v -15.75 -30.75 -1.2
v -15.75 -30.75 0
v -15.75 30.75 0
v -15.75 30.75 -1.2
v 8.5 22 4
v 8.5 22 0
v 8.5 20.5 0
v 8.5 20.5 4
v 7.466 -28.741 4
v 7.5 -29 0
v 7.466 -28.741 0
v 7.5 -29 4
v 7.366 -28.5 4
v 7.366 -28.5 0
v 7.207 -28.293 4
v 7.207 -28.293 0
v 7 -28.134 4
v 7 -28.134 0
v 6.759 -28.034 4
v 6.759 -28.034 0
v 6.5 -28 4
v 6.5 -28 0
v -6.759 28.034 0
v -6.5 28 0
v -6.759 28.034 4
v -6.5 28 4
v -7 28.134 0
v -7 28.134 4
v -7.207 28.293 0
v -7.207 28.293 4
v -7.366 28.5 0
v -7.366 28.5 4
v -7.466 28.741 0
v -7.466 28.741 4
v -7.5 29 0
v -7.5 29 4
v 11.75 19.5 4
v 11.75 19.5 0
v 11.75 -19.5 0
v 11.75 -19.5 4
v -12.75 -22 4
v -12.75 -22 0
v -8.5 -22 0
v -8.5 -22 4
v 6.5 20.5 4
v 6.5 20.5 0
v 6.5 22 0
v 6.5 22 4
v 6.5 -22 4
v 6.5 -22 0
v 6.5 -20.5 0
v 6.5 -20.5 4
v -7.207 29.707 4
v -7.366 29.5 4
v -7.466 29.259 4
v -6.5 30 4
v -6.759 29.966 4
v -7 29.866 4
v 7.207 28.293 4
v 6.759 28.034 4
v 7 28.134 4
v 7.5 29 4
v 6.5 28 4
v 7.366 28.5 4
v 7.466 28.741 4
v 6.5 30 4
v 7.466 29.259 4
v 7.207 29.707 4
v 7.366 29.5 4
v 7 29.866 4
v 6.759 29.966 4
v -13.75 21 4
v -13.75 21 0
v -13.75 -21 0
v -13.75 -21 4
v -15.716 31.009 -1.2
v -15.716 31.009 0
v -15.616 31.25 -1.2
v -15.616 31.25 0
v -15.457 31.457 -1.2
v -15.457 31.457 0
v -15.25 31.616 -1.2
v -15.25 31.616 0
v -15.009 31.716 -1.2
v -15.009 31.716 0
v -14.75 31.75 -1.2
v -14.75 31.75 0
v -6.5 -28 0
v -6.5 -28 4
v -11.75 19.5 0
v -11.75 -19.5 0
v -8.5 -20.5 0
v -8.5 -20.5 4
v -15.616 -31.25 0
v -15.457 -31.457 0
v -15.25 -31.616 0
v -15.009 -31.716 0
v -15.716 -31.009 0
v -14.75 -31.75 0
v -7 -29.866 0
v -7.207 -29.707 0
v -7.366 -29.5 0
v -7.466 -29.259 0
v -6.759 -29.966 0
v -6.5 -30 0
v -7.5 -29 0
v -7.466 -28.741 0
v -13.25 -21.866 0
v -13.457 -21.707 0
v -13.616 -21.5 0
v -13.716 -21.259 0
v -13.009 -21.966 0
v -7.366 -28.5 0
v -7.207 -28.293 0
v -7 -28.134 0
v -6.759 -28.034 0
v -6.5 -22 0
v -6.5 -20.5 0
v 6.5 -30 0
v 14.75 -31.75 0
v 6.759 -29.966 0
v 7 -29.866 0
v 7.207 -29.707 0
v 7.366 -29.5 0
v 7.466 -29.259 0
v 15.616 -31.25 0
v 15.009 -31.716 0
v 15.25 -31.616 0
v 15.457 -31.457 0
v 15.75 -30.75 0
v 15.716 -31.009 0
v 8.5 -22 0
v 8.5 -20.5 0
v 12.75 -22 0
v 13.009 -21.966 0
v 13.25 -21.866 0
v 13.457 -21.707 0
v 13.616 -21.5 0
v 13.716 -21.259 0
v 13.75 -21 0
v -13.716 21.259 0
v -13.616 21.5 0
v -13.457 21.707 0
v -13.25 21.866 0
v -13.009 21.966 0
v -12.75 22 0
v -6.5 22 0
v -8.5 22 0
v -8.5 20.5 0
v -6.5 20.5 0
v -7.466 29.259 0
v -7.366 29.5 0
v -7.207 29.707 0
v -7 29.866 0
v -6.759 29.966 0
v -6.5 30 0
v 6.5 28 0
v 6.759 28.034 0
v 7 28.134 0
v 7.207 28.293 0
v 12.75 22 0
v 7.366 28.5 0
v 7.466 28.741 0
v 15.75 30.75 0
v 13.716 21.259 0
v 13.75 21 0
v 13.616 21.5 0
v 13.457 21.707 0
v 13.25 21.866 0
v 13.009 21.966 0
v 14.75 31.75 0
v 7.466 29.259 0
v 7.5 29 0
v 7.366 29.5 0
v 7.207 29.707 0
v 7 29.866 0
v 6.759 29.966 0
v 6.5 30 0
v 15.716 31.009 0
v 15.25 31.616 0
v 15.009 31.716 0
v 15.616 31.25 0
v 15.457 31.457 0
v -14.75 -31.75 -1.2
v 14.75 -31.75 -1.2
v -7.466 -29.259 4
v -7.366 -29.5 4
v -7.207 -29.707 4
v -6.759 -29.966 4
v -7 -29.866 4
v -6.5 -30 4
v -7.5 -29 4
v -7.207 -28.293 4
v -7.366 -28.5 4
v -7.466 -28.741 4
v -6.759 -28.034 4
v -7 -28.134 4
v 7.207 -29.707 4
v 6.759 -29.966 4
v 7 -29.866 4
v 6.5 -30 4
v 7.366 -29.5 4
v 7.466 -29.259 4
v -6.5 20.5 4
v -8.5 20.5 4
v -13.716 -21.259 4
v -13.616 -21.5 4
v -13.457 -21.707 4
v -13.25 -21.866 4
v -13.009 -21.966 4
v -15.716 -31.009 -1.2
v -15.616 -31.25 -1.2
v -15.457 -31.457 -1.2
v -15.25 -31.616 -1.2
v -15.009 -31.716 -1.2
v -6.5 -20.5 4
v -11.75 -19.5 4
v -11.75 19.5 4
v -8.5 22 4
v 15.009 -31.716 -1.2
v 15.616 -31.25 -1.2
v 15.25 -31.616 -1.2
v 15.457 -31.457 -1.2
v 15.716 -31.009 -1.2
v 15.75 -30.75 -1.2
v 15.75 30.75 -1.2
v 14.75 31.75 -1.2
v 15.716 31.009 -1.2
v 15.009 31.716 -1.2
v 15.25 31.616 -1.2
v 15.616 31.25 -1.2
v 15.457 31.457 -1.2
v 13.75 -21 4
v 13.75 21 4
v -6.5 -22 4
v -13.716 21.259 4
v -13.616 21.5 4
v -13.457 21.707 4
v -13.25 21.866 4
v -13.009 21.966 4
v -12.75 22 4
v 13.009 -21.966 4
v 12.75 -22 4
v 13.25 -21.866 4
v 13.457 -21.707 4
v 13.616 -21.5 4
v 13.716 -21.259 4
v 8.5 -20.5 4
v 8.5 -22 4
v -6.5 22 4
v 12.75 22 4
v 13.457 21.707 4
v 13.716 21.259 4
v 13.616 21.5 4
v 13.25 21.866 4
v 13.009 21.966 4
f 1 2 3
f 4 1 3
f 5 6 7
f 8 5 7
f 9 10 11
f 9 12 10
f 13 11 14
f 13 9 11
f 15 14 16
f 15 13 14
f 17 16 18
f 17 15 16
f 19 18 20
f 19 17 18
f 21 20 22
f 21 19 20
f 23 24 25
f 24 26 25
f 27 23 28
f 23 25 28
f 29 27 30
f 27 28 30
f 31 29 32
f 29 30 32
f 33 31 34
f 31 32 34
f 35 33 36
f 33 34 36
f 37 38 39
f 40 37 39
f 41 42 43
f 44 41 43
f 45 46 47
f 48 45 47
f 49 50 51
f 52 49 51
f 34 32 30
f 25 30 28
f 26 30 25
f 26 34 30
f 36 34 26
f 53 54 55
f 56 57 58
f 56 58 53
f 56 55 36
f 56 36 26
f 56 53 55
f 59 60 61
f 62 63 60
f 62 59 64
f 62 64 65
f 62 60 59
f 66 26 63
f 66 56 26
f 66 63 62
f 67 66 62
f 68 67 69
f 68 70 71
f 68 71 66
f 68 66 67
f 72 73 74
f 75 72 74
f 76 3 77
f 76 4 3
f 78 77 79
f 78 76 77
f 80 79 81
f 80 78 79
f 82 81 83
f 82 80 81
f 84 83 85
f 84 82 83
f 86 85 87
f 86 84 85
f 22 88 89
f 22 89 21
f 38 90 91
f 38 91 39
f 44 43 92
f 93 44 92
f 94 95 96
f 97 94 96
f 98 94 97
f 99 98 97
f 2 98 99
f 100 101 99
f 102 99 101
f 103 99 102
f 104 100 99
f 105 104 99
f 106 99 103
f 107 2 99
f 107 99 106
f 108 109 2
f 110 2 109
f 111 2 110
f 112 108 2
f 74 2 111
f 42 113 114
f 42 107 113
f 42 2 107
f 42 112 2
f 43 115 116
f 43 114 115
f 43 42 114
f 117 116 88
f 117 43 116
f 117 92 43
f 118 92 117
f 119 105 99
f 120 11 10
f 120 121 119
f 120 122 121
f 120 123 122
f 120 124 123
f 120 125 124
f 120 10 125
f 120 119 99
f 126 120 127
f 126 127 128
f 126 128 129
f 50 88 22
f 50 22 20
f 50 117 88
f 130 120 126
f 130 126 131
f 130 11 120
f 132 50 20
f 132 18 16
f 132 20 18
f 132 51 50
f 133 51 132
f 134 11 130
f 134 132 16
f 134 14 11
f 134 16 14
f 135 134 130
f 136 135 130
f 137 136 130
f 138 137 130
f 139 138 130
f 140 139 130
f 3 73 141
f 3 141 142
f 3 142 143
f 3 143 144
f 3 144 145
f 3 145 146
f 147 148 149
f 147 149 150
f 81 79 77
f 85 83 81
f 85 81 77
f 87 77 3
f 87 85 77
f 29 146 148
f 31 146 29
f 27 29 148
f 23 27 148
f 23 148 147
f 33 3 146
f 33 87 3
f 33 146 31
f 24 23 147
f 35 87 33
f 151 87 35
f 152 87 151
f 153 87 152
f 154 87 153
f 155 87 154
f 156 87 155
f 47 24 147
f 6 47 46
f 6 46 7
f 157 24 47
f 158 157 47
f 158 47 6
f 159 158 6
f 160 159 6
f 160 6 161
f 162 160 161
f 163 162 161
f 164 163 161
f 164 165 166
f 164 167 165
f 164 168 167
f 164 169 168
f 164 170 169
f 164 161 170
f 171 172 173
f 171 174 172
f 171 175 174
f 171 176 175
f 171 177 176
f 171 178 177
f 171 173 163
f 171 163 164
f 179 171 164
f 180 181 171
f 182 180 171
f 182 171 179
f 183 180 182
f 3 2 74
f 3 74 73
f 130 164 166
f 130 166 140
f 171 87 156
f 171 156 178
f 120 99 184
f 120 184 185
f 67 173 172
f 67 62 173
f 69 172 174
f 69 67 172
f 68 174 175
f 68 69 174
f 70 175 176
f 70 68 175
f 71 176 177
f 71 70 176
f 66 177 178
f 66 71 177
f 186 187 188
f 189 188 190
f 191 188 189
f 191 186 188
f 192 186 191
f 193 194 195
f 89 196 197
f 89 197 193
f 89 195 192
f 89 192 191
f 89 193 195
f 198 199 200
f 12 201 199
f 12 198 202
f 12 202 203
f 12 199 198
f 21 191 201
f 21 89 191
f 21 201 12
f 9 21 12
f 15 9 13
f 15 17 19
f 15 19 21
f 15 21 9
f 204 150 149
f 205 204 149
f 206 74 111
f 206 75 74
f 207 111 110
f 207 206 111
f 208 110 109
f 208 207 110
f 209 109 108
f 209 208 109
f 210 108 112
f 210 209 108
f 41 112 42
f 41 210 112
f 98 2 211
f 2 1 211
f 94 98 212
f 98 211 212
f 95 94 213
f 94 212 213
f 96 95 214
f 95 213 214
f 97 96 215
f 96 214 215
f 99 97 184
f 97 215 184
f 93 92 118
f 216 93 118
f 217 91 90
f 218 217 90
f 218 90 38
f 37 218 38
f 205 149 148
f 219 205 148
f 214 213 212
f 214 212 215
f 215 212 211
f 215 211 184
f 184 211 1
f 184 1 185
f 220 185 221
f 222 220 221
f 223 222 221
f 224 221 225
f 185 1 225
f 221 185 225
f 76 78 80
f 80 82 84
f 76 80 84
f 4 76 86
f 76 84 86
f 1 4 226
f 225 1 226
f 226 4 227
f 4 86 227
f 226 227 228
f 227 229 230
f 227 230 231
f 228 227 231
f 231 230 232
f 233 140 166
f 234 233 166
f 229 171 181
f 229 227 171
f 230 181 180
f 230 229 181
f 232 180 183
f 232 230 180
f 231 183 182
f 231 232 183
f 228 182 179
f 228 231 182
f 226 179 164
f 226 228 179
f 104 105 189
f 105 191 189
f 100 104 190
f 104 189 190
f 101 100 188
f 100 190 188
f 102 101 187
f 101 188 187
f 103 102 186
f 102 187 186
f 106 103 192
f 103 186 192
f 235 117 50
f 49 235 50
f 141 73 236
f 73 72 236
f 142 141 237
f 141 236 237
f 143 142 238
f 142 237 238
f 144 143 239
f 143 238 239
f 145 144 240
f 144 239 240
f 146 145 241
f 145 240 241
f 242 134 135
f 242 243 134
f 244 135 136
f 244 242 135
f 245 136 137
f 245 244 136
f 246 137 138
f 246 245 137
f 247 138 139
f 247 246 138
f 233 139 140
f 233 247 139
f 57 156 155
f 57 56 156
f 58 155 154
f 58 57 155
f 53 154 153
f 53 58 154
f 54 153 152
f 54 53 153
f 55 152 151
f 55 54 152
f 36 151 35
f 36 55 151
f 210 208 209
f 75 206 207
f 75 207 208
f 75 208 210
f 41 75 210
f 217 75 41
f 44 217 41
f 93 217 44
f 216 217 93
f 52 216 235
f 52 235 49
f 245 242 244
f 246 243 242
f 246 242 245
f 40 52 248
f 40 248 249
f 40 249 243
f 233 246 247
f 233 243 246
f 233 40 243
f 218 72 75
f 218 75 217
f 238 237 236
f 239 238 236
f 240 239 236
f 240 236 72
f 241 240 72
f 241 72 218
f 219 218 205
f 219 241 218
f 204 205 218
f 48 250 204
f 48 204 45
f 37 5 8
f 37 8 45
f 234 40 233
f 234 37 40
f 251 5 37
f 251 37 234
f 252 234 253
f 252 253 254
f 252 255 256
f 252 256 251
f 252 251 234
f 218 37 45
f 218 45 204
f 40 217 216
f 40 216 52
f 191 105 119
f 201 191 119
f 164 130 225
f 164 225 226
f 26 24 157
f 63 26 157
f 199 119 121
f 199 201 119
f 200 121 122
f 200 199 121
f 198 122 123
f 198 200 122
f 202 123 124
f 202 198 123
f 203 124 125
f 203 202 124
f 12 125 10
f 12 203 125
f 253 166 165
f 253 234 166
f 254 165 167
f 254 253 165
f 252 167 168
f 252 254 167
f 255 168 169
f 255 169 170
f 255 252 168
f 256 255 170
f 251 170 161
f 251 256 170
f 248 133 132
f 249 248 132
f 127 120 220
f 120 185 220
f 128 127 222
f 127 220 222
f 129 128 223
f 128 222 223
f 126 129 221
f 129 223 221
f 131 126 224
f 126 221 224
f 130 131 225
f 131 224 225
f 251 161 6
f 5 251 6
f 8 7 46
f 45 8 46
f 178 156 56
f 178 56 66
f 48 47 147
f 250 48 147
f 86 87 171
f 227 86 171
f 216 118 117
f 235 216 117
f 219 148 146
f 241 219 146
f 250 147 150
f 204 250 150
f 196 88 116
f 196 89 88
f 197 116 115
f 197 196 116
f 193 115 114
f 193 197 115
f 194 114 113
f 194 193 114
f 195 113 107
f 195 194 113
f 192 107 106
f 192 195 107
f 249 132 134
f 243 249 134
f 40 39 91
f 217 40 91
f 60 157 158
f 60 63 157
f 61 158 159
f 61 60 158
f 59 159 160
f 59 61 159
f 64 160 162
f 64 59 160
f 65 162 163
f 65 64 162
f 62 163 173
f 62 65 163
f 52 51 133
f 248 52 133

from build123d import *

# Parameters (mm, degrees)
F0_W     = 31.5
F0_H     = 63.5
F0_W_2   = 23.5
F0_H_2   = 39
F0_W_3   = 15
F0_H_3   = 2
F0_W_4   = 2
F0_H_4   = 1.5
F1_DEPTH = 1.2
F2_DEPTH = 4
F3_R     = 0.99999


# Not quite as in the source:
# - a fillet or chamfer is up to 0.001 mm smaller than in the source, because OpenCascade refuses the exact size


with BuildPart() as f1:
    # F0 (on Top) → F1 (new body)
    with BuildSketch(Plane.XY):
        Rectangle(F0_W, F0_H)
        Polygon((13.75, -22), (13.75, -30), (7.5, -30), (-7.5, -30), (-13.75, -30), (-13.75, -22), (-13.75, 22), (-13.75, 30), (-7.5, 30), (7.5, 30), (13.75, 30), (13.75, 22), align=None, mode=Mode.SUBTRACT)
        Rectangle(F0_W_2, F0_H_2)
        Polygon((-7.5, -28), (7.5, -28), (11.75, -28), (11.75, -22), (8.5, -22), (6.5, -22), (-6.5, -22), (-8.5, -22), (-11.75, -22), (-11.75, -28), align=None)
        Polygon((8.5, 22), (11.75, 22), (11.75, 28), (7.5, 28), (-7.5, 28), (-11.75, 28), (-11.75, 22), (-8.5, 22), (-6.5, 22), (6.5, 22), align=None)
        Polygon((-13.75, 22), (-13.75, -22), (-11.75, -22), (-11.75, -19.5), (-11.75, 19.5), (-11.75, 22), align=None)
        Polygon((11.75, -22), (13.75, -22), (13.75, 22), (11.75, 22), (11.75, 19.5), (11.75, -19.5), align=None)
        Polygon((8.5, -22), (11.75, -22), (11.75, -19.5), (-11.75, -19.5), (-11.75, -22), (-8.5, -22), (-8.5, -20.5), (-6.5, -20.5), (-6.5, -22), (6.5, -22), (6.5, -20.5), (8.5, -20.5), align=None)
        Polygon((11.75, 19.5), (11.75, 22), (8.5, 22), (8.5, 20.5), (6.5, 20.5), (6.5, 22), (-6.5, 22), (-6.5, 20.5), (-8.5, 20.5), (-8.5, 22), (-11.75, 22), (-11.75, 19.5), align=None)
        with Locations((0, -29)):
            Rectangle(F0_W_3, F0_H_3)
        with Locations((0, 29)):
            Rectangle(F0_W_3, F0_H_3)
        Polygon((7.5, -30), (13.75, -30), (13.75, -22), (11.75, -22), (11.75, -28), (7.5, -28), align=None)
        Polygon((-13.75, -30), (-7.5, -30), (-7.5, -28), (-11.75, -28), (-11.75, -22), (-13.75, -22), align=None)
        Polygon((11.75, 22), (13.75, 22), (13.75, 30), (7.5, 30), (7.5, 28), (11.75, 28), align=None)
        Polygon((-13.75, 30), (-13.75, 22), (-11.75, 22), (-11.75, 28), (-7.5, 28), (-7.5, 30), align=None)
        with Locations((-7.5, 21.25)):
            Rectangle(F0_W_4, F0_H_4)
        with Locations((7.5, 21.25)):
            Rectangle(F0_W_4, F0_H_4)
        with Locations((-7.5, -21.25)):
            Rectangle(F0_W_4, F0_H_4)
        with Locations((7.5, -21.25)):
            Rectangle(F0_W_4, F0_H_4)
    extrude(amount=-F1_DEPTH)

    # F0 (on Top) → F2 (join)
    with BuildSketch(Plane.XY):
        Polygon((-13.75, 22), (-13.75, -22), (-11.75, -22), (-11.75, -19.5), (-11.75, 19.5), (-11.75, 22), align=None)
        Polygon((11.75, 19.5), (11.75, 22), (8.5, 22), (8.5, 20.5), (6.5, 20.5), (6.5, 22), (-6.5, 22), (-6.5, 20.5), (-8.5, 20.5), (-8.5, 22), (-11.75, 22), (-11.75, 19.5), align=None)
        Polygon((11.75, -22), (13.75, -22), (13.75, 22), (11.75, 22), (11.75, 19.5), (11.75, -19.5), align=None)
        Polygon((8.5, -22), (11.75, -22), (11.75, -19.5), (-11.75, -19.5), (-11.75, -22), (-8.5, -22), (-8.5, -20.5), (-6.5, -20.5), (-6.5, -22), (6.5, -22), (6.5, -20.5), (8.5, -20.5), align=None)
        with Locations((0, 29)):
            Rectangle(F0_W_3, F0_H_3)
        with Locations((0, -29)):
            Rectangle(F0_W_3, F0_H_3)
    extrude(amount=F2_DEPTH)

    # F3 (radius 1 in the source; OpenCascade refuses exactly that, so slightly less here)
    f3_edges = [f1.edges().sort_by_distance(p)[0] for p in [
        (-13.75, 22, 2),
        (13.75, 22, 2),
        (13.75, -22, 2),
        (-13.75, -22, 2),
        (-15.75, -31.75, -0.6),
        (15.75, -31.75, -0.6),
        (-15.75, 31.75, -0.6),
        (15.75, 31.75, -0.6),
        (-7.5, -30, 2),
        (7.5, -30, 2),
        (7.5, -28, 2),
        (-7.5, -28, 2),
        (-7.5, 28, 2),
        (7.5, 28, 2),
        (7.5, 30, 2),
        (-7.5, 30, 2),
    ]]
    fillet(f3_edges, radius=F3_R)


solid = f1.part
